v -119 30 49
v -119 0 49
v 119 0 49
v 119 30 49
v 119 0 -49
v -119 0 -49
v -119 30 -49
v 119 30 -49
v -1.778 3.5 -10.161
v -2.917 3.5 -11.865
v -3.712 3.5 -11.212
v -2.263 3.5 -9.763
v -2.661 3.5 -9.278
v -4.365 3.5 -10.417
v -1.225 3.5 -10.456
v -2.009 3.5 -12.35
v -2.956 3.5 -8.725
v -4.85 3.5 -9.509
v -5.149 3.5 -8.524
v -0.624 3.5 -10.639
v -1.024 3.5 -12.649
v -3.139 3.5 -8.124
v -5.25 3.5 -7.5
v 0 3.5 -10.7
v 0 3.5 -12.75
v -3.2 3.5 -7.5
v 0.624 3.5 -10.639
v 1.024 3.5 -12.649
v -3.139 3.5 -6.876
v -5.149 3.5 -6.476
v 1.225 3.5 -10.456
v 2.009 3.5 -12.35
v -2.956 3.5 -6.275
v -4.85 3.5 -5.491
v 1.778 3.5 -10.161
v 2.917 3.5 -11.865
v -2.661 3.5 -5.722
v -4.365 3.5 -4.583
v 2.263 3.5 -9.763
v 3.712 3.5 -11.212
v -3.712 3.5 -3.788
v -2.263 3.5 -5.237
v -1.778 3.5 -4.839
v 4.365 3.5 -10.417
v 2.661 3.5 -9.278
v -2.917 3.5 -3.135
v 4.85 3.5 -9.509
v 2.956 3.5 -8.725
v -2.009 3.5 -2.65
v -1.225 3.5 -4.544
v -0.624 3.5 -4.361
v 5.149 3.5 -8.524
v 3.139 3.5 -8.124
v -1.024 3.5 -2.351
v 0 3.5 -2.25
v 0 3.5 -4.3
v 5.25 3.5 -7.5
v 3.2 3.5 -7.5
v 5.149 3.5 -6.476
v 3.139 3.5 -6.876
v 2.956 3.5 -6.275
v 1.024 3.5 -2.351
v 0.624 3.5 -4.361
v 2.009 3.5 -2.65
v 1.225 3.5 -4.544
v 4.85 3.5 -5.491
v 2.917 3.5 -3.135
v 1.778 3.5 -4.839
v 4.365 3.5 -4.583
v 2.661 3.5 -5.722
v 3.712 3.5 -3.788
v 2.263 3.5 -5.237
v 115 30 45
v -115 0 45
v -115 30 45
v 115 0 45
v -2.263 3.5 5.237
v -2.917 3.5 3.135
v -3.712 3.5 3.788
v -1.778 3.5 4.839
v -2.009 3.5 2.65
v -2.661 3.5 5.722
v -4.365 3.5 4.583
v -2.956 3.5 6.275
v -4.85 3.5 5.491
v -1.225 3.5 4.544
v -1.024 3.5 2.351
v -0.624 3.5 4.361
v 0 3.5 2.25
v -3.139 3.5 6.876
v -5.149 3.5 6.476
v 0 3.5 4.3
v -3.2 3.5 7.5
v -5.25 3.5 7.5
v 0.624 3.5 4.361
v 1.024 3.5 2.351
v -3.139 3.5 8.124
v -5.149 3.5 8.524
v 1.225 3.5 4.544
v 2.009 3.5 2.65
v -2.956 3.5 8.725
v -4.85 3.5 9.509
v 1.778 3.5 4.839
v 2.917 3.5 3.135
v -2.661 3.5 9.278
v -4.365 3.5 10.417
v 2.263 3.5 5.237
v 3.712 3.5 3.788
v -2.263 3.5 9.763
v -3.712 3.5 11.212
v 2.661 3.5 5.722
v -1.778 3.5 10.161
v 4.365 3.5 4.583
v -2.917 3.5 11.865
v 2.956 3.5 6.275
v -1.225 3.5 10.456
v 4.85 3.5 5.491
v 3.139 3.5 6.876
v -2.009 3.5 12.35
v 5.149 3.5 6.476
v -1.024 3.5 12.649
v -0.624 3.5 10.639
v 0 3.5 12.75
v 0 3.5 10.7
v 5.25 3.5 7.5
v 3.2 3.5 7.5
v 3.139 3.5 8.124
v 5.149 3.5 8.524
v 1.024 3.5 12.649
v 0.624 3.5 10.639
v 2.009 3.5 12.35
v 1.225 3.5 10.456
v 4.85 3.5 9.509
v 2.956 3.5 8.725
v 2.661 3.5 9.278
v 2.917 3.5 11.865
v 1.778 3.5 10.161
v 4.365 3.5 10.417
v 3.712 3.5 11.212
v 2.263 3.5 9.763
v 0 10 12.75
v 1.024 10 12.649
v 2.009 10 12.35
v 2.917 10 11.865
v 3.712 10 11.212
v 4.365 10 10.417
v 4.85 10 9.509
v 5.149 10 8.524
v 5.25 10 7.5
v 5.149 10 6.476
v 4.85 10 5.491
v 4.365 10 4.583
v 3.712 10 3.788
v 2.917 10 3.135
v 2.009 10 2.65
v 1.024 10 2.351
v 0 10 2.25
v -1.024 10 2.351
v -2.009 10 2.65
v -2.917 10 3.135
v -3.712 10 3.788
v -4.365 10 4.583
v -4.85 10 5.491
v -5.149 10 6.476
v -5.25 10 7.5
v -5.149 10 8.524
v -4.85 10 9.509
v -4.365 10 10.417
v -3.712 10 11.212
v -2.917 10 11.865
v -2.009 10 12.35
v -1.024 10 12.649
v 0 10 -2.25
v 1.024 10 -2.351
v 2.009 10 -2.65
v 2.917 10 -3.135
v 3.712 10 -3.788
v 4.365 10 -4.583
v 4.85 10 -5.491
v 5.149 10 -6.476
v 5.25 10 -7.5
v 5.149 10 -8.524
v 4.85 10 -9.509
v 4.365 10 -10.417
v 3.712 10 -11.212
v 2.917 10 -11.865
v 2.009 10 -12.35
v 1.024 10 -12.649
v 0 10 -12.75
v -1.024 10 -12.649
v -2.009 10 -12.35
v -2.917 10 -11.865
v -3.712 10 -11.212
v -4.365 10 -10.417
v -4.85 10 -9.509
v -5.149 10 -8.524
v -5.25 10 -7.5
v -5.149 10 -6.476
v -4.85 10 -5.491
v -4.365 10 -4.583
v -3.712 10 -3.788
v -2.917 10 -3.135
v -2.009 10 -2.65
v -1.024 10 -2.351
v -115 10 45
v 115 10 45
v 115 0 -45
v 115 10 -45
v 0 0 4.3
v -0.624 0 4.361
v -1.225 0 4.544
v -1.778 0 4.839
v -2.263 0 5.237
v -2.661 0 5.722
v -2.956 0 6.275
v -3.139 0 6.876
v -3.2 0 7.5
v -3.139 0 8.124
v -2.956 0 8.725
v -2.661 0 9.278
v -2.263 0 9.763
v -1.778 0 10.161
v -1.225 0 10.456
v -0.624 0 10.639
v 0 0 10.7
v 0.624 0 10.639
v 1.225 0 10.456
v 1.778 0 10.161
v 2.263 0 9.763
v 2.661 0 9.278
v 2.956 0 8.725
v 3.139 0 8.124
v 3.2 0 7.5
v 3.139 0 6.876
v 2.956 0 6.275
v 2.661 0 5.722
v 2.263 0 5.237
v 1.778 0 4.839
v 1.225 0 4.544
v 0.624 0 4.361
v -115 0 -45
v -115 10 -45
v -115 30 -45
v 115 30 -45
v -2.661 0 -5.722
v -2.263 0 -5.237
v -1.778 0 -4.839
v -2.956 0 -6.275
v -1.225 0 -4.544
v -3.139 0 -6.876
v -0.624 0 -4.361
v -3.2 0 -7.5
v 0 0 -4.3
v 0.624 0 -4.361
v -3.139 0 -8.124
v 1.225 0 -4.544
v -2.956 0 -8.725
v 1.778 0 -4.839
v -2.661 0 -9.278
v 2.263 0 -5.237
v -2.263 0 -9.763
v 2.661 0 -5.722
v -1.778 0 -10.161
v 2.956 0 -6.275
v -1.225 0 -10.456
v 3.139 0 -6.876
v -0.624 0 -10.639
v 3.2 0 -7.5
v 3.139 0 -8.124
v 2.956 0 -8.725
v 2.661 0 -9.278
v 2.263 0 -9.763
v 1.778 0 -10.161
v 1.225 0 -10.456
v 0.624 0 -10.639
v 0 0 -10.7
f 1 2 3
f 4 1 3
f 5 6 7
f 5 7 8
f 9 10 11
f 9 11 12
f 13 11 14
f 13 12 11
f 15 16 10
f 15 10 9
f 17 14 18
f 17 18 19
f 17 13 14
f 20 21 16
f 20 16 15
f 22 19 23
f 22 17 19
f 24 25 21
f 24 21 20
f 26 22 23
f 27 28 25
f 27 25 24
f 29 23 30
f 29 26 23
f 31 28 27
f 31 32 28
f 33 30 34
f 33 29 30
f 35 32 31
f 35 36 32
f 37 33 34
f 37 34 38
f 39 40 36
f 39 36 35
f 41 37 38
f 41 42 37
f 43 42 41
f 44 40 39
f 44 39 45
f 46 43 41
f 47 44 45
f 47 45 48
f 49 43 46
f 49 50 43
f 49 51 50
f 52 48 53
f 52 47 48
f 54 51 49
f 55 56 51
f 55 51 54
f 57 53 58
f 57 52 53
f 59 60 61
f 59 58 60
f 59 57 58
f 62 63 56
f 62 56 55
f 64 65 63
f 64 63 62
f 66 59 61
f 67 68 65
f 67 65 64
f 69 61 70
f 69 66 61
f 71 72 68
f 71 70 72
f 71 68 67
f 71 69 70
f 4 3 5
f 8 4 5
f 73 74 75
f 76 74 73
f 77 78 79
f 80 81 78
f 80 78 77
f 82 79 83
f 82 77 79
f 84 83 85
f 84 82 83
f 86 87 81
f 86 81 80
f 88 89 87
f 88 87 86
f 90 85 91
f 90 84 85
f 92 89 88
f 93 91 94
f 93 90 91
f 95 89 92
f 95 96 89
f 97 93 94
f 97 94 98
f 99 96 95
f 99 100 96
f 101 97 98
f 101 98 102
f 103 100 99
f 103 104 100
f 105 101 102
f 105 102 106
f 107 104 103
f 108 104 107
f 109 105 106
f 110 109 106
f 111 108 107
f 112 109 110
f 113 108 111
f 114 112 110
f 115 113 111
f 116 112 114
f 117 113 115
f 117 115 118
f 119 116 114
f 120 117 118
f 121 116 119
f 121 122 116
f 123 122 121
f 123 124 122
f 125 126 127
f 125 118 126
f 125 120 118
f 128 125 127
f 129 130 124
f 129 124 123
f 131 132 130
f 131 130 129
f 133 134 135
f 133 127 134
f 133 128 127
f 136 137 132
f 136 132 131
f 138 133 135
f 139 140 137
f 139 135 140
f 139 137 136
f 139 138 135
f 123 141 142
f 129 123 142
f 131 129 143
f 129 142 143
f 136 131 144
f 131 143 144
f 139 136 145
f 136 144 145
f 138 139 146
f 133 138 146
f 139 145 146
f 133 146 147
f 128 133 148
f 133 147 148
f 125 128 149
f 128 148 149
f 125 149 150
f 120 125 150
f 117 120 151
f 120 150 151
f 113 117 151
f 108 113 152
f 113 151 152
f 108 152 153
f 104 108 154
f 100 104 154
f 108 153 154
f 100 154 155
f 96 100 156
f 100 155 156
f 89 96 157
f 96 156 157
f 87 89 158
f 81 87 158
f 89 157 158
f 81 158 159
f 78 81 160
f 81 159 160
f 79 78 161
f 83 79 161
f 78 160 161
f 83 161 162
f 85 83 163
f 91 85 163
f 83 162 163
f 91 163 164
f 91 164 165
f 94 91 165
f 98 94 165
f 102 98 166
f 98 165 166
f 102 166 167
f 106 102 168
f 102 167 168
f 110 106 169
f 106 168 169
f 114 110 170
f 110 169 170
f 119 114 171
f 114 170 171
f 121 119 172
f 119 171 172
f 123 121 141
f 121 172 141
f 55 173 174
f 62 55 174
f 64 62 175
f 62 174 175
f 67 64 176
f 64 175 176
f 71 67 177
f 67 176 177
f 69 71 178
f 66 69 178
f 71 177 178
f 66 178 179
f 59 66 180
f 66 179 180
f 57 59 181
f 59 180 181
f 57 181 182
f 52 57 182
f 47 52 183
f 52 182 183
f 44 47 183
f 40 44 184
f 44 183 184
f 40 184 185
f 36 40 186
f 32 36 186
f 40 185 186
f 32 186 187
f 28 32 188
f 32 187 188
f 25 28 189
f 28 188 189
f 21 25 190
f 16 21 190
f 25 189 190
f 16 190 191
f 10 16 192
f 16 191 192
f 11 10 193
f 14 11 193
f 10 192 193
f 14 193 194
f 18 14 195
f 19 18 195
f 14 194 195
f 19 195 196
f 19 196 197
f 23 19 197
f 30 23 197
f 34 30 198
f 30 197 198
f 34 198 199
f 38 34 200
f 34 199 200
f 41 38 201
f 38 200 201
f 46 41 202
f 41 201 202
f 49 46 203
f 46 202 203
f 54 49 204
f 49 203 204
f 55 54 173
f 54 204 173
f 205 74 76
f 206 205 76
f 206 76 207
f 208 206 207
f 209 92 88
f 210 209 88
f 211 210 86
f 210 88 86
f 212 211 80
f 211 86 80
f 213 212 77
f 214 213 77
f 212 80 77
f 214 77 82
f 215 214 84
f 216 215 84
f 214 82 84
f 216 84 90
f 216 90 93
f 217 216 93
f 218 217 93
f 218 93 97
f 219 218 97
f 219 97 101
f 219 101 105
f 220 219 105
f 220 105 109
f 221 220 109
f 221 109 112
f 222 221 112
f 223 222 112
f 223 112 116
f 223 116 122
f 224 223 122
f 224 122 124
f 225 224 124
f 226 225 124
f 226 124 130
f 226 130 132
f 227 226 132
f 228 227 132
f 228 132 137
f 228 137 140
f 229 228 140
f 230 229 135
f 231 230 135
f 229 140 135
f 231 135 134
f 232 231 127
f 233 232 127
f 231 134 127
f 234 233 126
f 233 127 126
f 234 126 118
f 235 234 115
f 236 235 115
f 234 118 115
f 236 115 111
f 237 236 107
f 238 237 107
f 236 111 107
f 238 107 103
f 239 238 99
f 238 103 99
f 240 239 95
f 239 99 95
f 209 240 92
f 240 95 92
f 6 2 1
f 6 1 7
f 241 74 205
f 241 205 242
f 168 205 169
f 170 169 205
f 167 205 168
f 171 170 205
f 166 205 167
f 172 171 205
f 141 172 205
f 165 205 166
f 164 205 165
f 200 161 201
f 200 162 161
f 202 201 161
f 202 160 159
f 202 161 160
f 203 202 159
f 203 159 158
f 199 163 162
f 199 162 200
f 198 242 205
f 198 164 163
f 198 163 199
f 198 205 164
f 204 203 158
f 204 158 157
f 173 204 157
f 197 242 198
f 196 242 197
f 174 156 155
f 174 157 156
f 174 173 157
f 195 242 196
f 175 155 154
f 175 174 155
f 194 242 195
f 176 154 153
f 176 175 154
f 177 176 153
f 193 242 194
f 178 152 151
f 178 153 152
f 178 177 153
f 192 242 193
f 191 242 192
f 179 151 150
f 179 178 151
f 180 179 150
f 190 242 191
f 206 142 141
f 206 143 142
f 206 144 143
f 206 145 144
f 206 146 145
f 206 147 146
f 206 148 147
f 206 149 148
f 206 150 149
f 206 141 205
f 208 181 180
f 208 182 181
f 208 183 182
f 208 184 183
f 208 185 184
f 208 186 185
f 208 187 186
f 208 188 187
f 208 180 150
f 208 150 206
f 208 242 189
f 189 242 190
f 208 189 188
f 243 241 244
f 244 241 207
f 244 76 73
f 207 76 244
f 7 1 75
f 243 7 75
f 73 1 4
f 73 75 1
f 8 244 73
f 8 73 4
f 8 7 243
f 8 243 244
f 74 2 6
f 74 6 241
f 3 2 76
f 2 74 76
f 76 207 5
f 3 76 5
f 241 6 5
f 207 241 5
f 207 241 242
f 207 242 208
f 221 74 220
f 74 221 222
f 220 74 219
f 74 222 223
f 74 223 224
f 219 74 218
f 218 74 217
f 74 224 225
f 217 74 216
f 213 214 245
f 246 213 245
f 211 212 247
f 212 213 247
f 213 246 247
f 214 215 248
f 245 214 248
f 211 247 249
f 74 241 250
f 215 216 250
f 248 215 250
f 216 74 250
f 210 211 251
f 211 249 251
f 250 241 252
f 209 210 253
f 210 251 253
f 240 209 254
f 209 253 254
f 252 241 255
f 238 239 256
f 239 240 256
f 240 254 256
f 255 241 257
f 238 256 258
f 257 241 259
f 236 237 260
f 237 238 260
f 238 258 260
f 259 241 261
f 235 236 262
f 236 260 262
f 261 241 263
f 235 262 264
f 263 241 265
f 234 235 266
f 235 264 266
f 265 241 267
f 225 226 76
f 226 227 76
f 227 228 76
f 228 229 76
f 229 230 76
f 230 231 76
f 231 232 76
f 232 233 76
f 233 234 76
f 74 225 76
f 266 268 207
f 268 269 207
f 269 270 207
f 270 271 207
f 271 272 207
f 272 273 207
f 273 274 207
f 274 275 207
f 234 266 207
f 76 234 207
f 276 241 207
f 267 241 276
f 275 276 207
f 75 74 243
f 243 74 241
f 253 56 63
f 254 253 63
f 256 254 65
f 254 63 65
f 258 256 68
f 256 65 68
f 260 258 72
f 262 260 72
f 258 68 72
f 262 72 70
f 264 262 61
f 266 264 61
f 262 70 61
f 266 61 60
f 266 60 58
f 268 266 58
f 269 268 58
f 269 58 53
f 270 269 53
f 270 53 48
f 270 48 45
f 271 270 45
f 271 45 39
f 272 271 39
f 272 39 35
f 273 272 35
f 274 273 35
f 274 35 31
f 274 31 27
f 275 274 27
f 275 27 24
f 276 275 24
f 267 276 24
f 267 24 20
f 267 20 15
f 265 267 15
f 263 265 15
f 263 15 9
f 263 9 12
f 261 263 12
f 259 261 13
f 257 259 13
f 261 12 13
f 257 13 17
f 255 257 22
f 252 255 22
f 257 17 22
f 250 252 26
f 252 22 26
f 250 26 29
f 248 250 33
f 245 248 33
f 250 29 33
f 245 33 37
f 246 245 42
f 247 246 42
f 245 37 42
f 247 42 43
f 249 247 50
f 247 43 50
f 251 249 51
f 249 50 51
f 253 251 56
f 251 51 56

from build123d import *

# Parameters (mm, degrees)
SKETCH1_W           = 238
SKETCH1_H           = 98
SKETCH1_W_2         = 230
SKETCH1_H_2         = 90
BOSS_EXTRUDE1_DEPTH = 30
SKETCH1_2_W         = 230
SKETCH1_2_H         = 90
BOSS_EXTRUDE2_DEPTH = 10
SKETCH3_R           = 3.2
CUT_EXTRUDE1_DEPTH  = 131.238243231
SKETCH3_3_R         = 5.25
CUT_EXTRUDE2_DEPTH  = 6.5


with BuildPart() as part:
    # Sketch1 → Boss-Extrude1 (new body)
    with BuildSketch(Plane(origin=(0, 0, 0), x_dir=(1, 0, 0), z_dir=(0, 1, 0))):
        Rectangle(SKETCH1_W, SKETCH1_H)
        Rectangle(SKETCH1_W_2, SKETCH1_H_2, mode=Mode.SUBTRACT)
    extrude(amount=BOSS_EXTRUDE1_DEPTH)


with BuildPart() as body_2:
    # Sketch1<2> → Boss-Extrude2 (new body)
    with BuildSketch(Plane(origin=(0, 0, 0), x_dir=(1, 0, 0), z_dir=(0, 1, 0))):
        Rectangle(SKETCH1_2_W, SKETCH1_2_H)
    extrude(amount=BOSS_EXTRUDE2_DEPTH)

    # Sketch3 → Cut-Extrude1 (cut, through all)
    with BuildSketch(Plane(origin=(0, 10, 0), x_dir=(1, 0, 0), z_dir=(0, 1, 0))):
        with Locations((0, 7.5)):
            Circle(SKETCH3_R)
        with Locations((0, -7.5)):
            Circle(SKETCH3_R)
    extrude(amount=-CUT_EXTRUDE1_DEPTH, mode=Mode.SUBTRACT)

    # Sketch3<3> → Cut-Extrude2 (cut)
    with BuildSketch(Plane(origin=(0, 10, 0), x_dir=(1, 0, 0), z_dir=(0, 1, 0))):
        with Locations((0, 7.5)):
            Circle(SKETCH3_3_R)
        with Locations((0, -7.5)):
            Circle(SKETCH3_3_R)
    extrude(amount=-CUT_EXTRUDE2_DEPTH, mode=Mode.SUBTRACT)


solid = Compound([part.part, body_2.part])
